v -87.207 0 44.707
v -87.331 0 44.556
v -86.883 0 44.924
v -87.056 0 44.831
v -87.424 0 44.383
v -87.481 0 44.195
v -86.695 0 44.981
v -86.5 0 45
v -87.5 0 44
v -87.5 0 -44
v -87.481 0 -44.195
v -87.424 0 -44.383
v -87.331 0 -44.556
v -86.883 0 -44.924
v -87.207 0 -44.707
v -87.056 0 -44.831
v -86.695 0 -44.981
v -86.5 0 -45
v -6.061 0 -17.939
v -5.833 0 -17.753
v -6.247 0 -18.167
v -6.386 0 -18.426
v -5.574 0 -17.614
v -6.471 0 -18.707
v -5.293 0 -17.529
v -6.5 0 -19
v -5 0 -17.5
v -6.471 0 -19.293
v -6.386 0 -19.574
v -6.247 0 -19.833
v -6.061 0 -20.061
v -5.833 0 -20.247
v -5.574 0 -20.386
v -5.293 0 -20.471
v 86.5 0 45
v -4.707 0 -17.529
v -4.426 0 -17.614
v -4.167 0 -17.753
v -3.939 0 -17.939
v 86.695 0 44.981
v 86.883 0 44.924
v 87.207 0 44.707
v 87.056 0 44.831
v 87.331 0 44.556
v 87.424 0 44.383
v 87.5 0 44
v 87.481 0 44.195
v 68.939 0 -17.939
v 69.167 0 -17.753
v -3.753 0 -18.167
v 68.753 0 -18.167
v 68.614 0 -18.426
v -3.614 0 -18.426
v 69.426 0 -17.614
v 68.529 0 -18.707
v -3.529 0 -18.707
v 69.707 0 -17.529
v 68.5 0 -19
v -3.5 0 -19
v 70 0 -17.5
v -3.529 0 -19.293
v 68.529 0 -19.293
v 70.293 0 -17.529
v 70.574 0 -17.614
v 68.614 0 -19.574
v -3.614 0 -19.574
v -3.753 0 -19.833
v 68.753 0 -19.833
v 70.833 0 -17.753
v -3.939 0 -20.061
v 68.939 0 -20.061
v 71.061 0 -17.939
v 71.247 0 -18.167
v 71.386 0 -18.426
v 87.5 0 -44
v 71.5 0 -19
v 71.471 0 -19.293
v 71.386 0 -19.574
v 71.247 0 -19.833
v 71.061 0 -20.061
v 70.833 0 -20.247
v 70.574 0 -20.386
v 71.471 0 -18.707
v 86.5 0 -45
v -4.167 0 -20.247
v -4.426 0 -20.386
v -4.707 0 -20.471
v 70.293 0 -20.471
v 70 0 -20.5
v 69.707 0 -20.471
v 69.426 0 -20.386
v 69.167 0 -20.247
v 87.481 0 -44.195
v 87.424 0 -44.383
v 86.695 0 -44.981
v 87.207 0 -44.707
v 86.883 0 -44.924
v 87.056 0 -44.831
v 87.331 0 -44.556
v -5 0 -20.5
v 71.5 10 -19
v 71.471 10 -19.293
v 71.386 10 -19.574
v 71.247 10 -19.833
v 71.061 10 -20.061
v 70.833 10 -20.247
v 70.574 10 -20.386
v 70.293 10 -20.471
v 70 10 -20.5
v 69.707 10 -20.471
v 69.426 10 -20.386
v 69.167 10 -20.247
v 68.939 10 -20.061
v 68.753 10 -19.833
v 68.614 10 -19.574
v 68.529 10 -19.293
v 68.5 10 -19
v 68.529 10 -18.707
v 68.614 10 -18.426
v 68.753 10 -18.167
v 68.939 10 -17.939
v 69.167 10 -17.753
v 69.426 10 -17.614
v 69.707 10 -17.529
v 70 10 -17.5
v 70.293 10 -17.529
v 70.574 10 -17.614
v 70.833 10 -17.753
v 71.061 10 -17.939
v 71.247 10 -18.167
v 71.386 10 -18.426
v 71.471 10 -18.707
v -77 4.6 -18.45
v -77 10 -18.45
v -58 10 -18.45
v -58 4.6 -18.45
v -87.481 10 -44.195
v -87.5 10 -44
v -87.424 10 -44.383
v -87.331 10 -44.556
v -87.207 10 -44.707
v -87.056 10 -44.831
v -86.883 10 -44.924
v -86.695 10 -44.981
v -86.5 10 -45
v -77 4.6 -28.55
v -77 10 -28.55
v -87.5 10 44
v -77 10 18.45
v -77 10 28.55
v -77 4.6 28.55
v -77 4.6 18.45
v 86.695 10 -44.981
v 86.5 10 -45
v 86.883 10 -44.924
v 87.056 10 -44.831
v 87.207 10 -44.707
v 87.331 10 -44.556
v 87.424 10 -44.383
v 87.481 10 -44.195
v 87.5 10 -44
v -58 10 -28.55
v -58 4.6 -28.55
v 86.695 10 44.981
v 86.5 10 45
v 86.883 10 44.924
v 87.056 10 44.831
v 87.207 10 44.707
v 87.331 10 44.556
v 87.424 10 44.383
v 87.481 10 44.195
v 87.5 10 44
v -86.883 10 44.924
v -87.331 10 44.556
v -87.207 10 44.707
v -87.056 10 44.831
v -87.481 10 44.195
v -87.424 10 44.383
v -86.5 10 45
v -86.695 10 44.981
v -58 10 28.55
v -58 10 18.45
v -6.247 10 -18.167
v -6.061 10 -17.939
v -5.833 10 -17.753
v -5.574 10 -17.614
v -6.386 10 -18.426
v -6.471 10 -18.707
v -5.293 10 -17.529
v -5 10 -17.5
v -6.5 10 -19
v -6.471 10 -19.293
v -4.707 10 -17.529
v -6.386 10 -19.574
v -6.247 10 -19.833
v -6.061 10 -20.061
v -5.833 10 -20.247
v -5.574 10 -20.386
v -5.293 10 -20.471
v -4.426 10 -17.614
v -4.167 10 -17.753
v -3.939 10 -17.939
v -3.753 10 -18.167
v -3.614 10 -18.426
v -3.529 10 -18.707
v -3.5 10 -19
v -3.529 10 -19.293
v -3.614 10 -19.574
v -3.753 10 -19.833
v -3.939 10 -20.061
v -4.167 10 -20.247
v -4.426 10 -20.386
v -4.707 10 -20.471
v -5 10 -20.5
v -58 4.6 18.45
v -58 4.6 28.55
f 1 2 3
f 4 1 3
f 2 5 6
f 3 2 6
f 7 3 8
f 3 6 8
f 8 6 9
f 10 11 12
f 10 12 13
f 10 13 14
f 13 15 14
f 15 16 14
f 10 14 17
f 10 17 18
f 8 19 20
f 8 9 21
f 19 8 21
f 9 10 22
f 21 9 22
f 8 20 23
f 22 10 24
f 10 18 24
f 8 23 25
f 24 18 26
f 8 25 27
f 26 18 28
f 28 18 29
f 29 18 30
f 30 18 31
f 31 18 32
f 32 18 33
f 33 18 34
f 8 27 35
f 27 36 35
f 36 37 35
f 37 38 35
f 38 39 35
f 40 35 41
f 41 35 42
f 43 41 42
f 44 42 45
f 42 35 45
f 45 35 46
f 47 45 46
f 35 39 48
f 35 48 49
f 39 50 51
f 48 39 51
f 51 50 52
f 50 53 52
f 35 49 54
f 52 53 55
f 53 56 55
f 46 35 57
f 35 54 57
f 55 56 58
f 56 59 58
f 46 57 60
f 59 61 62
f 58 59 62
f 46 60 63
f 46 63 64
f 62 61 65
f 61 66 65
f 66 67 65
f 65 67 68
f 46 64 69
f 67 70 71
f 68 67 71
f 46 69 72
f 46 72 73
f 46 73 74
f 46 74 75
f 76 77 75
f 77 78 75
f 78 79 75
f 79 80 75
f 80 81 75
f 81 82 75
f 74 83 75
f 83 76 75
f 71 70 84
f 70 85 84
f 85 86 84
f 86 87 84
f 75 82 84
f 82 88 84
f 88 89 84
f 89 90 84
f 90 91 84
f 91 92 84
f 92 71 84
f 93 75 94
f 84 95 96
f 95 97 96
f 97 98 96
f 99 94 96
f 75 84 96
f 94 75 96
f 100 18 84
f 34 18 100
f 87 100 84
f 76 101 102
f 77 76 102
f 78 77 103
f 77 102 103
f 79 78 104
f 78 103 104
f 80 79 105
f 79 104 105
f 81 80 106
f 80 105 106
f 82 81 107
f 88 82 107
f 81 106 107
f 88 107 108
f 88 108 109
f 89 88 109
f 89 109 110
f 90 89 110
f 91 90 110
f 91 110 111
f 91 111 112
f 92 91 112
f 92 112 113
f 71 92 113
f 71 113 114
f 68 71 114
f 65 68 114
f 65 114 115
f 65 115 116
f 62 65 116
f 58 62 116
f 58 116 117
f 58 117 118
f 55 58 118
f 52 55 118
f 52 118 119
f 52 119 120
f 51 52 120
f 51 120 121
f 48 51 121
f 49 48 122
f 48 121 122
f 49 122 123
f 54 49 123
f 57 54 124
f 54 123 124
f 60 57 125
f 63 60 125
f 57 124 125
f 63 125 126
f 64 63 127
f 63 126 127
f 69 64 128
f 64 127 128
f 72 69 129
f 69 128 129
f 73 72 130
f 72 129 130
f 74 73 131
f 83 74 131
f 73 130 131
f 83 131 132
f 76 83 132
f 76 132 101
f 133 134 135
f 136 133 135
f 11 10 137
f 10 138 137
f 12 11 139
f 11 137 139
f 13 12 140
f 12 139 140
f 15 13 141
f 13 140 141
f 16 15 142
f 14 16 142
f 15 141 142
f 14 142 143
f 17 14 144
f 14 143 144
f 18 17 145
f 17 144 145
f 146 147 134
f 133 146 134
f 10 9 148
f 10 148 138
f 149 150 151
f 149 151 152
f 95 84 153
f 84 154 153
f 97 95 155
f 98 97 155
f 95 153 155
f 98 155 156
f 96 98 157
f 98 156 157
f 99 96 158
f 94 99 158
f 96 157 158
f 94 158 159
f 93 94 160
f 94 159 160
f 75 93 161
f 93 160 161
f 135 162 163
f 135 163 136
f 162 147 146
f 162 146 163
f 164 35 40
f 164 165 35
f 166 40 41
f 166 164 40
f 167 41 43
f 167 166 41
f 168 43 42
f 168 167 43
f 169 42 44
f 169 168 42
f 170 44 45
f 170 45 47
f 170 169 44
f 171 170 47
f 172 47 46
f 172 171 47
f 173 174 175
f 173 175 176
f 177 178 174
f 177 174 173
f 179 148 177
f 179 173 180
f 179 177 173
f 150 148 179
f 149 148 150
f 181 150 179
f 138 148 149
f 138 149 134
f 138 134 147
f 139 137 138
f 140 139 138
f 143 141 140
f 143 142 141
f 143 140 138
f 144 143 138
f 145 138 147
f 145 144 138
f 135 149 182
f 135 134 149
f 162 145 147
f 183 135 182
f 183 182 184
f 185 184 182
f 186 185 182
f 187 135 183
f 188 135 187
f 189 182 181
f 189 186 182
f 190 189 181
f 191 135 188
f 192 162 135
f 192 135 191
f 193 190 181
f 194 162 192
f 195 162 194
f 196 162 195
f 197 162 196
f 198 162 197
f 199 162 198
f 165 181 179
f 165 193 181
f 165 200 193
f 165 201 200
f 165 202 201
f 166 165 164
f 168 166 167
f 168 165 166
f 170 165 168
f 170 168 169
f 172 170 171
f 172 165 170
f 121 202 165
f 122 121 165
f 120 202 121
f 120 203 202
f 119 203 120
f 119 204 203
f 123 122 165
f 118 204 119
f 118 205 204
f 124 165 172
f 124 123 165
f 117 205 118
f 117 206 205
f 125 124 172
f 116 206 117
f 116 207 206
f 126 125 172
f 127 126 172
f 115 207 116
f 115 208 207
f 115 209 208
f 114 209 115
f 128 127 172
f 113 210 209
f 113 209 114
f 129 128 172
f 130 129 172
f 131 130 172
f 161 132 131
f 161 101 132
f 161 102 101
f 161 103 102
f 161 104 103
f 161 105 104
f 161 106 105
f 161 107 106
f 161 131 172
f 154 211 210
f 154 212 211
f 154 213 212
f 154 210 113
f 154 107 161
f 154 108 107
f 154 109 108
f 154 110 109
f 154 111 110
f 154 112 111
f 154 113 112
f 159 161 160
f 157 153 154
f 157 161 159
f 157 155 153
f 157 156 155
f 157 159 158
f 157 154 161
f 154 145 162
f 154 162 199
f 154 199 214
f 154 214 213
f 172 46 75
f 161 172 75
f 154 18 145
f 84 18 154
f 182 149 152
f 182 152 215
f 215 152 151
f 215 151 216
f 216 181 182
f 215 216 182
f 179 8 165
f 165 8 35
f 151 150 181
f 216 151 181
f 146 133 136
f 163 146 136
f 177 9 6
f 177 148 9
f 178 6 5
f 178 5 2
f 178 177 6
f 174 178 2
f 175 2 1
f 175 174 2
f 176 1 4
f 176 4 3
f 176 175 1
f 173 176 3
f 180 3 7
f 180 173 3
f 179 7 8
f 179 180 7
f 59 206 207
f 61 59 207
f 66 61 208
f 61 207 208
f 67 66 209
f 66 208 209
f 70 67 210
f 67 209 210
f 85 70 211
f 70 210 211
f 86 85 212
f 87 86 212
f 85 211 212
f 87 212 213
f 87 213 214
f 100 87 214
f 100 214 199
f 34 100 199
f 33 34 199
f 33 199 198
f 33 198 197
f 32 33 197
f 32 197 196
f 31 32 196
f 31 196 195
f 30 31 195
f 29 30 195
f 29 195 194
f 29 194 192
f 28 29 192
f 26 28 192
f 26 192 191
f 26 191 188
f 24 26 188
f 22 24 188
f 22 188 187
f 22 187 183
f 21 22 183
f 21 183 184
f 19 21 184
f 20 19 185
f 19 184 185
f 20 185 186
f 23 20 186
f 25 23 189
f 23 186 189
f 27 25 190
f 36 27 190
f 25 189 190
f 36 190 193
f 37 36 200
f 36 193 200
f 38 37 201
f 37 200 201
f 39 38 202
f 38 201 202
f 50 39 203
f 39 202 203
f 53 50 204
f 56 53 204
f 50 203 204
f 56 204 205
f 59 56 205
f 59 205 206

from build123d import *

# Parameters (mm, degrees)
SKETCH1_W           = 175
SKETCH1_H           = 90
BOSS_EXTRUDE1_DEPTH = 10
SKETCH2_W           = 19
SKETCH2_H           = 10.1
CUT_EXTRUDE1_DEPTH  = 5.4
SKETCH2_8_R         = 1.5
CUT_EXTRUDE3_DEPTH  = 11
FILLET1_R           = 1


with BuildPart() as part:
    # Sketch1 → Boss-Extrude1 (new body)
    with BuildSketch(Plane(origin=(0, 0, 0), x_dir=(1, 0, 0), z_dir=(0, 1, 0))):
        Rectangle(SKETCH1_W, SKETCH1_H)
    extrude(amount=BOSS_EXTRUDE1_DEPTH)

    # Sketch2 → Cut-Extrude1 (cut)
    with BuildSketch(Plane(origin=(0, 10, 0), x_dir=(1, 0, 0), z_dir=(0, 1, 0))):
        with Locations((-67.5, -23.5)):
            Rectangle(SKETCH2_W, SKETCH2_H)
    cut_extrude1 = extrude(amount=-CUT_EXTRUDE1_DEPTH, mode=Mode.SUBTRACT)

    # Mirror1: Cut-Extrude1 across plane
    add(cut_extrude1.mirror(Plane.XY), mode=Mode.SUBTRACT)

    # Sketch2<8> → Cut-Extrude3 (cut, through all)
    with BuildSketch(Plane(origin=(0, 10, 0), x_dir=(1, 0, 0), z_dir=(0, 1, 0))):
        with Locations((-5, 19)):
            Circle(SKETCH2_8_R)
        with Locations((70, 19)):
            Circle(SKETCH2_8_R)
    extrude(amount=-CUT_EXTRUDE3_DEPTH, mode=Mode.SUBTRACT)

    # Fillet1
    fillet1_edges = [part.edges().sort_by_distance(p)[0] for p in [
        (-87.5, 5, -45),
        (87.5, 5, -45),
        (87.5, 5, 45),
        (-87.5, 5, 45),
    ]]
    fillet(fillet1_edges, radius=FILLET1_R)


solid = part.part
